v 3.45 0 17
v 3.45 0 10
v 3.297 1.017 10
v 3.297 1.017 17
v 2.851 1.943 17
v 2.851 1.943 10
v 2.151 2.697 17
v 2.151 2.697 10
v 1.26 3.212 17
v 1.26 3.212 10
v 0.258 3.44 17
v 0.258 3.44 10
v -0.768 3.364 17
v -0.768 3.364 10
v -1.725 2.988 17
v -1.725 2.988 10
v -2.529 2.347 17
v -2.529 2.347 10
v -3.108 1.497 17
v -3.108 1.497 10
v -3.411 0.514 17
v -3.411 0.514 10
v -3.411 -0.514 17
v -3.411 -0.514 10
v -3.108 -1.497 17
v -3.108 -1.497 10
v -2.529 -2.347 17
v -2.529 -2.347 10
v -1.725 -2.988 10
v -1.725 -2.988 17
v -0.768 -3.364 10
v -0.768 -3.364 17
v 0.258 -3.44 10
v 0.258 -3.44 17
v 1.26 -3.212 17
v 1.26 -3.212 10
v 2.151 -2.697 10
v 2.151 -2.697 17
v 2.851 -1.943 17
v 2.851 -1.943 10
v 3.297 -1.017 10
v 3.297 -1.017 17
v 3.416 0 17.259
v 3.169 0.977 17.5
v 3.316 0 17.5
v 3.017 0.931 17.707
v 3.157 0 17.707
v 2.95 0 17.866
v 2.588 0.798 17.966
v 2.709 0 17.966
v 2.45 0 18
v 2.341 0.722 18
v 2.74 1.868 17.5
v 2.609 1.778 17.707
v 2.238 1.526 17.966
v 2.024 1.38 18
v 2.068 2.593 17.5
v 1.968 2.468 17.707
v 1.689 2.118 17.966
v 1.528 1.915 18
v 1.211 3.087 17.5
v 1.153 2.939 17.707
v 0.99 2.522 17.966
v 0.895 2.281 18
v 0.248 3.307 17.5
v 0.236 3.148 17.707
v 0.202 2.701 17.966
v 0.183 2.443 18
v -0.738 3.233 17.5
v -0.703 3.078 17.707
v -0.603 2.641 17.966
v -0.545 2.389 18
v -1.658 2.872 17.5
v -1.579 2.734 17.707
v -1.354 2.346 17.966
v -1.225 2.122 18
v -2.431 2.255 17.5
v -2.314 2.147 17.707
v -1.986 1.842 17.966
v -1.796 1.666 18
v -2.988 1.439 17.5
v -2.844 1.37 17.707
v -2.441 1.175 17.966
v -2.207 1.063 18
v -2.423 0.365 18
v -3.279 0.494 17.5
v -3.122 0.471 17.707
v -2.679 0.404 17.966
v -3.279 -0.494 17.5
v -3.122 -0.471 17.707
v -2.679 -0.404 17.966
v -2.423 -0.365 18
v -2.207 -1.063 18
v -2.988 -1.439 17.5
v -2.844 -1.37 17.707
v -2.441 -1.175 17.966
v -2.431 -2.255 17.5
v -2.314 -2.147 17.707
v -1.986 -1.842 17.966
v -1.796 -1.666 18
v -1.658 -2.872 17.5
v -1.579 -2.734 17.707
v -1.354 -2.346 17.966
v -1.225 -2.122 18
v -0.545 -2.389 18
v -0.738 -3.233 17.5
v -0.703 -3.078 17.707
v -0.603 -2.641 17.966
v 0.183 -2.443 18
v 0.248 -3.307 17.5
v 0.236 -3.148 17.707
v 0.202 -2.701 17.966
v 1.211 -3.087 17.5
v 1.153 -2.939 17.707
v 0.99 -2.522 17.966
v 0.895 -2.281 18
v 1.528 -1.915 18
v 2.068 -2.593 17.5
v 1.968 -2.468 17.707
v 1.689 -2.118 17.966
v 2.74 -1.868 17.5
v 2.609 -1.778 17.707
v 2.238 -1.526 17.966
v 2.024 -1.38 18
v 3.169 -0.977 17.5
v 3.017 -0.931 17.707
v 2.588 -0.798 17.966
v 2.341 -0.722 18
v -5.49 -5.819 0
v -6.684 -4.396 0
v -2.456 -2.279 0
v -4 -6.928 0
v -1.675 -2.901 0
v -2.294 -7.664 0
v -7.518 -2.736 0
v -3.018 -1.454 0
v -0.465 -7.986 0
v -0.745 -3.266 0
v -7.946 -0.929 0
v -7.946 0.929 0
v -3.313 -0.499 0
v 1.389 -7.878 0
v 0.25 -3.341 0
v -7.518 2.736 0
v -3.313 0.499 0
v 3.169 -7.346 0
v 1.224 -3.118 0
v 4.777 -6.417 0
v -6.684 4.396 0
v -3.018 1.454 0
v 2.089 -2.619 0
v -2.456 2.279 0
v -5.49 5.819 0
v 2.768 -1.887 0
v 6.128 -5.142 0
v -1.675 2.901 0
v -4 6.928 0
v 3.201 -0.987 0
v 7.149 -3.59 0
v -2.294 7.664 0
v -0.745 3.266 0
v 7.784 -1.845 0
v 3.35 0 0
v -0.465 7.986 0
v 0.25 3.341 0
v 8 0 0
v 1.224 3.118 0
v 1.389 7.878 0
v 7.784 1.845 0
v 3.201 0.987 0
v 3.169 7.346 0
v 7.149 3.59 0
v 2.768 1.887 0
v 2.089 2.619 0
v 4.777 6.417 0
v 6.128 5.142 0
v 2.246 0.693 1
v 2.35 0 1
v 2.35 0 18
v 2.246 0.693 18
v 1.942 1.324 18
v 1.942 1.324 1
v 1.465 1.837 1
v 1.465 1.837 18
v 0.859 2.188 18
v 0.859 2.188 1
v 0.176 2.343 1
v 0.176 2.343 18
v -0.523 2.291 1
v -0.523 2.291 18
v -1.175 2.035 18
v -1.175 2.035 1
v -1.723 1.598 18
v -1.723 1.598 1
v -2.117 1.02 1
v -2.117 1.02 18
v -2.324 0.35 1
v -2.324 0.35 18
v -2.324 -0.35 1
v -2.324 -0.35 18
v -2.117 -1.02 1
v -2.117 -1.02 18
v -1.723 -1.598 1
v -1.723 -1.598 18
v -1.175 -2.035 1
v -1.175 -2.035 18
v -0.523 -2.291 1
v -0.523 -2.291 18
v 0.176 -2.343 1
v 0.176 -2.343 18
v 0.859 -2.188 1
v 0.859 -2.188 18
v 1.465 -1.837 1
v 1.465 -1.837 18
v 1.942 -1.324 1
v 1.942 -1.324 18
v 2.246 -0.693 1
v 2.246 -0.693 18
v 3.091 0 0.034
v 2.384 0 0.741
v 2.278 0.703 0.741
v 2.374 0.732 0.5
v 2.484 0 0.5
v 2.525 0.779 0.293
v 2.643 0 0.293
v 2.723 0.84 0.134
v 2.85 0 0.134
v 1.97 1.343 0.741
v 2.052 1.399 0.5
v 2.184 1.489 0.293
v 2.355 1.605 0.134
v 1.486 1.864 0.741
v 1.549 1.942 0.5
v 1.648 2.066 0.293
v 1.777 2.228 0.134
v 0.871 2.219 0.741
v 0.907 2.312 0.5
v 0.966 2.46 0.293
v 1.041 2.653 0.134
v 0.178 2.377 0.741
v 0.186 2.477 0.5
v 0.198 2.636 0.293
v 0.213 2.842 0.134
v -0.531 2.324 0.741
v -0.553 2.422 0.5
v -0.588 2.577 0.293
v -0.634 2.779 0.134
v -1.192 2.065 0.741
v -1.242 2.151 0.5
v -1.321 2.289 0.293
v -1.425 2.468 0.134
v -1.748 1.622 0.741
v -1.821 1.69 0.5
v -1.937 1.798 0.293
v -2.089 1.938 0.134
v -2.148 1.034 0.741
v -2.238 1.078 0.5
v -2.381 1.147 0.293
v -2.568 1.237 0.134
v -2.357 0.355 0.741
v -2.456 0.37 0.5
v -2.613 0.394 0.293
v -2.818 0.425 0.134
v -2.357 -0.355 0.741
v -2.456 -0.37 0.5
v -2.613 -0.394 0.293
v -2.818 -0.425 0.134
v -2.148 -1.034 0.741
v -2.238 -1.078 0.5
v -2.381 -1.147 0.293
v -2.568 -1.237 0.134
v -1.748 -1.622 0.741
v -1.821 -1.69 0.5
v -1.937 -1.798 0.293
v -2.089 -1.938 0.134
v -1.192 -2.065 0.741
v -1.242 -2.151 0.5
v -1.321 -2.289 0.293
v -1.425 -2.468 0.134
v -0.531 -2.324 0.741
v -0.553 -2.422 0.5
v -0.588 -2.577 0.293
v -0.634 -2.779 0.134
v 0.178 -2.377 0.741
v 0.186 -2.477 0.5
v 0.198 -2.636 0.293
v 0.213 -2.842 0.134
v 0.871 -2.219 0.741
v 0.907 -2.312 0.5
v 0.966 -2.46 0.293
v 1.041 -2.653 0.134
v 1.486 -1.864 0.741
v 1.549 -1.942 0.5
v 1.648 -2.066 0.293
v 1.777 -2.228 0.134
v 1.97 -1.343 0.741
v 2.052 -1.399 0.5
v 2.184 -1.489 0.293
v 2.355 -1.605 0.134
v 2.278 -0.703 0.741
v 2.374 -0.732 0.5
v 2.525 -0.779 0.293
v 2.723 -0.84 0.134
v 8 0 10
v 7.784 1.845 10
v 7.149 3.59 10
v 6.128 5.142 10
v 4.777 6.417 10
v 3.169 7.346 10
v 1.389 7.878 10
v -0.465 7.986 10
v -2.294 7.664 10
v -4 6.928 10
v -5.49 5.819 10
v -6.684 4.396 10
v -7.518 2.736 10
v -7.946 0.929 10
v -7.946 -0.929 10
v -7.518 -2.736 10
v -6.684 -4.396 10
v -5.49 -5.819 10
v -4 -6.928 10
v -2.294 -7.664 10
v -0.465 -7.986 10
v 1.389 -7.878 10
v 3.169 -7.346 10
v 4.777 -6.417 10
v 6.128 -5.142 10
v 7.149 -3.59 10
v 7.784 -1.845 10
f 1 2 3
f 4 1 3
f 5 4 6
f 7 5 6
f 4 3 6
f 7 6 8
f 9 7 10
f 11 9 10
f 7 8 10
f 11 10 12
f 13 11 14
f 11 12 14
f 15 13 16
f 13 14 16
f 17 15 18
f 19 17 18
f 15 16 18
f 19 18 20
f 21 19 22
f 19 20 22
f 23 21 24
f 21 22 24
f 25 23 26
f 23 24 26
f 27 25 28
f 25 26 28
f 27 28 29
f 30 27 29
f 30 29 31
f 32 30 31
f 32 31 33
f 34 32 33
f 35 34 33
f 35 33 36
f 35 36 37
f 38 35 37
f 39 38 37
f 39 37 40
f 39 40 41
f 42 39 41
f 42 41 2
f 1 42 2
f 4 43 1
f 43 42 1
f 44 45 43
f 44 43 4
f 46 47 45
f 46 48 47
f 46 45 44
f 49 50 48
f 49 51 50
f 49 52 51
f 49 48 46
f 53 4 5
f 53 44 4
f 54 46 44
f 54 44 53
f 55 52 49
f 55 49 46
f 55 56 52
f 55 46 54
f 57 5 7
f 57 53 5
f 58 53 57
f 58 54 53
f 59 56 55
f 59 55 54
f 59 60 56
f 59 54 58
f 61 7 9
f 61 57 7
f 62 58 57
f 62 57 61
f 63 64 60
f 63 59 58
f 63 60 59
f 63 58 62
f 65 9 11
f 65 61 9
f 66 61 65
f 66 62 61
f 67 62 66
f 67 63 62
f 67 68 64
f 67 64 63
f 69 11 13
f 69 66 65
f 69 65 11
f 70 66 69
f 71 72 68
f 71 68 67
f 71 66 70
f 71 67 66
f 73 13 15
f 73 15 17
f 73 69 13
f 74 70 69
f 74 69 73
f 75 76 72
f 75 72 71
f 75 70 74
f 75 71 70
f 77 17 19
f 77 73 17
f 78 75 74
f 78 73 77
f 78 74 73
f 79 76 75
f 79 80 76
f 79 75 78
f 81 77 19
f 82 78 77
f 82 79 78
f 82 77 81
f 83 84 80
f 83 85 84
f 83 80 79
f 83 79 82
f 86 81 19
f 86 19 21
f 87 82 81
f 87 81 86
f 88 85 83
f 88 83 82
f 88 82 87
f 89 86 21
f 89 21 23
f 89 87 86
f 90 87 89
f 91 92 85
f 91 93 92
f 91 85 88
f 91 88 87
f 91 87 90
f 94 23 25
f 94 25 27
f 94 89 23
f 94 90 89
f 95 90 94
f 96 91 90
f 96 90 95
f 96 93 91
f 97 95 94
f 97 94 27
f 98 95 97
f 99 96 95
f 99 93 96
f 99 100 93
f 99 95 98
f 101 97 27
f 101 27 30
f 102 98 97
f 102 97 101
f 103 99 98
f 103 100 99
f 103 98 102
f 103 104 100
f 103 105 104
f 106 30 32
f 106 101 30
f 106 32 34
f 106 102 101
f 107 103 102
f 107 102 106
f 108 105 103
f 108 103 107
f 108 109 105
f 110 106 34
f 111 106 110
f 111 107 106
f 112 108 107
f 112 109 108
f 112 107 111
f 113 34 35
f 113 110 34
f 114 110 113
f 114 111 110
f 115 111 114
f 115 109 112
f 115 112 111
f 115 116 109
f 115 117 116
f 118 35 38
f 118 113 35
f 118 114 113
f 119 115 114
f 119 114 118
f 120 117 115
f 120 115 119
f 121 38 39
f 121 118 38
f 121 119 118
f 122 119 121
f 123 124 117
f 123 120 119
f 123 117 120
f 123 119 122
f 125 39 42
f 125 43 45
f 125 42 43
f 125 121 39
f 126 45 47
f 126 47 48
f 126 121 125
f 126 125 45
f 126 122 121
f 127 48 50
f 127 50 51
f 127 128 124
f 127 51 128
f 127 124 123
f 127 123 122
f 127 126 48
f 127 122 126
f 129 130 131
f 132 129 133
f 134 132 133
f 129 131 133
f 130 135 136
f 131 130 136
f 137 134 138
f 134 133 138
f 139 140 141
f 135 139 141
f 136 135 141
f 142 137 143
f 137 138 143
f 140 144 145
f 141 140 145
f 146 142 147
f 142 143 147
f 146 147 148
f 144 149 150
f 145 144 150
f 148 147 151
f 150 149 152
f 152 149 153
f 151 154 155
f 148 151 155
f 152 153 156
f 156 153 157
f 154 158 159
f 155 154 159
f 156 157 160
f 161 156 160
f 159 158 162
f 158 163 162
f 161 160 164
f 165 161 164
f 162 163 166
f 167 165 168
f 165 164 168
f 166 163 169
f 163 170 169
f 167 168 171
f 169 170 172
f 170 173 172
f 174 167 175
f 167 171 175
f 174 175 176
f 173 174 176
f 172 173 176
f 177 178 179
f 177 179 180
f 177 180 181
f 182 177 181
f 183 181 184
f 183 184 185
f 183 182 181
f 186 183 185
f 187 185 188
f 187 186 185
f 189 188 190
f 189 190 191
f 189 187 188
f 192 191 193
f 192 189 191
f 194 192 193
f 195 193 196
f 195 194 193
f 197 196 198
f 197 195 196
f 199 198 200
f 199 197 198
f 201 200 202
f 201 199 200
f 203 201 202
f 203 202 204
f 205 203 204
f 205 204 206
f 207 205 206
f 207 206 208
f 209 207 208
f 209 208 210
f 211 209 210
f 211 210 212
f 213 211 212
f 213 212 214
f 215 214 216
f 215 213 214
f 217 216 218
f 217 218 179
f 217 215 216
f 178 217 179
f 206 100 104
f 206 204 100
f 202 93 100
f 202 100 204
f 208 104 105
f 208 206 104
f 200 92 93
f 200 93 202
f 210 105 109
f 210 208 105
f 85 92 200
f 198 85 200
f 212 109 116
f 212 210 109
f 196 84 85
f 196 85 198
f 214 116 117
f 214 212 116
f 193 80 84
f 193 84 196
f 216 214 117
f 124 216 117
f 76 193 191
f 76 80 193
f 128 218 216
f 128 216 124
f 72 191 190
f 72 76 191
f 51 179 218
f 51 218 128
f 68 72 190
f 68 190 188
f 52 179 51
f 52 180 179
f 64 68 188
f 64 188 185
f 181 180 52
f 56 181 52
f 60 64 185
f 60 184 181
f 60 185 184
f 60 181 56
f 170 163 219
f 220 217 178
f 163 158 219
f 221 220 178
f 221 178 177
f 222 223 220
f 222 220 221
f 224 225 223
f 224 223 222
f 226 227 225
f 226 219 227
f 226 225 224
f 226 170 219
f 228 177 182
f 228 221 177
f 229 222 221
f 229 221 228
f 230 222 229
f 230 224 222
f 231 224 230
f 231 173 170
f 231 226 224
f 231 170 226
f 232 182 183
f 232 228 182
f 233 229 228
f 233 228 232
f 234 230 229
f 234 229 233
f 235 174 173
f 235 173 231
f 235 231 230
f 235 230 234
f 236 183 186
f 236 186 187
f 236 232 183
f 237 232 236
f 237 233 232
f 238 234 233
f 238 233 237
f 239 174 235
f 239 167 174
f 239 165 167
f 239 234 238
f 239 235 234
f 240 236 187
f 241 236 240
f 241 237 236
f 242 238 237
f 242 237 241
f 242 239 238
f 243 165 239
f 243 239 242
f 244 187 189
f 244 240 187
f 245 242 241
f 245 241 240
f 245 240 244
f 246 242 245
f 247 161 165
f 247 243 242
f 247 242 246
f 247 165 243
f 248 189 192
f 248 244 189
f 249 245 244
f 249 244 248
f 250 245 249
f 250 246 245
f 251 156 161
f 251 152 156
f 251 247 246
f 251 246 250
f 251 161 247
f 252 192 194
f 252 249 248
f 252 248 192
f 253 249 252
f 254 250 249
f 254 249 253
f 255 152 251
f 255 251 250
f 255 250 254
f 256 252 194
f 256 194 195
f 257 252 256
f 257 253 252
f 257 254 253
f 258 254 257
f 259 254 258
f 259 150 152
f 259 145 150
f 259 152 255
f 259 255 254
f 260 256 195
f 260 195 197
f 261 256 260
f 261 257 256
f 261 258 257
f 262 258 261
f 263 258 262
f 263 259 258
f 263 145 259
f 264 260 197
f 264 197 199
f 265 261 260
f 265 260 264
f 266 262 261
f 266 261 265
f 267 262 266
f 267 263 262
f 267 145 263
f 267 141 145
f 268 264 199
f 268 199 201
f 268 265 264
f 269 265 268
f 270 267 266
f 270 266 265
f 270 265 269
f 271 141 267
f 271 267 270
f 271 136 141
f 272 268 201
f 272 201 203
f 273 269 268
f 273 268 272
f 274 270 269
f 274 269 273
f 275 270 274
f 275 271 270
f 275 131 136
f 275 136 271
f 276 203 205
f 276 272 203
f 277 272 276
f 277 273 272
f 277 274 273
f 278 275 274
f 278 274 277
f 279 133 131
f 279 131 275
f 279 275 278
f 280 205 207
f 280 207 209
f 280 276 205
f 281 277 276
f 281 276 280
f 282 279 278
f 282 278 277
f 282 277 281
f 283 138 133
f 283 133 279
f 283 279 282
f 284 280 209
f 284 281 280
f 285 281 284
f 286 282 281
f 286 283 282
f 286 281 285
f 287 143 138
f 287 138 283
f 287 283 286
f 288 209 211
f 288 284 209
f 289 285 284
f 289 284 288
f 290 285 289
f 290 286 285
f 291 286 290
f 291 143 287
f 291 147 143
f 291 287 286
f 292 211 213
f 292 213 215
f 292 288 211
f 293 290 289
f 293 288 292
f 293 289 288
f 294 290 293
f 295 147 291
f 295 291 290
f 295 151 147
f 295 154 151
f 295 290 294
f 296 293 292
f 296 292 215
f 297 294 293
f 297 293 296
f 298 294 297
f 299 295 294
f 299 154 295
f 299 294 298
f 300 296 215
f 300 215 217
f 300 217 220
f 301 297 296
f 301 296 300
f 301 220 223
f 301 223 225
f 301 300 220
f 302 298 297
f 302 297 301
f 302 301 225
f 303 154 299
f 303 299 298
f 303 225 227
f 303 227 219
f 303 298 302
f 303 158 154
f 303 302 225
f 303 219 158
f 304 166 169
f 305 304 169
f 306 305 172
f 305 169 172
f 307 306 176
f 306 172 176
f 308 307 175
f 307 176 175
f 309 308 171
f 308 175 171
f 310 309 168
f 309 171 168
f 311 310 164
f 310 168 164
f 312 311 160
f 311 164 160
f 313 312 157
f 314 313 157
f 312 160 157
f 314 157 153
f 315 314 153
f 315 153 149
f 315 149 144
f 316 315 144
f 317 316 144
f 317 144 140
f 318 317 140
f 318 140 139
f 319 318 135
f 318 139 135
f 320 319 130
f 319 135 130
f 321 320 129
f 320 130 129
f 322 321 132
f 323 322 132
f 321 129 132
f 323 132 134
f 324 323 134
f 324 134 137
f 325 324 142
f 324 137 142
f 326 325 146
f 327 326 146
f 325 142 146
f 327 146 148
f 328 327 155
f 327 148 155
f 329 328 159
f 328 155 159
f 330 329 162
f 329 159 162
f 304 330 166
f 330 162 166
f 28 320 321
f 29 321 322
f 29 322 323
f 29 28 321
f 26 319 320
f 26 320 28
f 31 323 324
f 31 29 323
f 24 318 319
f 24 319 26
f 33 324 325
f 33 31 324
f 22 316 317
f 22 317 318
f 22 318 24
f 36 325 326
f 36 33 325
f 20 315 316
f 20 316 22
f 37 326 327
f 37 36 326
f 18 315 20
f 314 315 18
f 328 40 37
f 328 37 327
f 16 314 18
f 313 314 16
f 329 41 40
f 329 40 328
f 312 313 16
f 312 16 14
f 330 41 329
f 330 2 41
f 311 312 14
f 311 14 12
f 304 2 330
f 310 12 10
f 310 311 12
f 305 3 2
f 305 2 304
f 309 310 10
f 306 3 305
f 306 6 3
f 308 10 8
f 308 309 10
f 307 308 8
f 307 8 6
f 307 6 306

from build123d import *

# Parameters (mm, degrees)
F0_R     = 3.45
F0_R_2   = 2.35
F1_DEPTH = 18
F2_R     = 8
F2_R_2   = 3.45
F3_DEPTH = 10
F4_R     = 1
F5_R     = 1


with BuildPart() as f1:
    # F0 (on Top) → F1 (new body)
    with BuildSketch(Plane.XY):
        Circle(F0_R)
        Circle(F0_R_2, mode=Mode.SUBTRACT)
    extrude(amount=F1_DEPTH)

    # F2 (on Top) → F3 (join)
    with BuildSketch(Plane.XY):
        Circle(F2_R)
        Circle(F2_R_2, mode=Mode.SUBTRACT)
    extrude(amount=F3_DEPTH)

    # F4
    f4_edges = [f1.edges().sort_by_distance(p)[0] for p in [
        (-3.45, 0, 18),
    ]]
    fillet(f4_edges, radius=F4_R)

    # F5
    f5_edges = [f1.edges().sort_by_distance(p)[0] for p in [
        (-2.35, 0, 0),
    ]]
    fillet(f5_edges, radius=F5_R)


solid = f1.part
